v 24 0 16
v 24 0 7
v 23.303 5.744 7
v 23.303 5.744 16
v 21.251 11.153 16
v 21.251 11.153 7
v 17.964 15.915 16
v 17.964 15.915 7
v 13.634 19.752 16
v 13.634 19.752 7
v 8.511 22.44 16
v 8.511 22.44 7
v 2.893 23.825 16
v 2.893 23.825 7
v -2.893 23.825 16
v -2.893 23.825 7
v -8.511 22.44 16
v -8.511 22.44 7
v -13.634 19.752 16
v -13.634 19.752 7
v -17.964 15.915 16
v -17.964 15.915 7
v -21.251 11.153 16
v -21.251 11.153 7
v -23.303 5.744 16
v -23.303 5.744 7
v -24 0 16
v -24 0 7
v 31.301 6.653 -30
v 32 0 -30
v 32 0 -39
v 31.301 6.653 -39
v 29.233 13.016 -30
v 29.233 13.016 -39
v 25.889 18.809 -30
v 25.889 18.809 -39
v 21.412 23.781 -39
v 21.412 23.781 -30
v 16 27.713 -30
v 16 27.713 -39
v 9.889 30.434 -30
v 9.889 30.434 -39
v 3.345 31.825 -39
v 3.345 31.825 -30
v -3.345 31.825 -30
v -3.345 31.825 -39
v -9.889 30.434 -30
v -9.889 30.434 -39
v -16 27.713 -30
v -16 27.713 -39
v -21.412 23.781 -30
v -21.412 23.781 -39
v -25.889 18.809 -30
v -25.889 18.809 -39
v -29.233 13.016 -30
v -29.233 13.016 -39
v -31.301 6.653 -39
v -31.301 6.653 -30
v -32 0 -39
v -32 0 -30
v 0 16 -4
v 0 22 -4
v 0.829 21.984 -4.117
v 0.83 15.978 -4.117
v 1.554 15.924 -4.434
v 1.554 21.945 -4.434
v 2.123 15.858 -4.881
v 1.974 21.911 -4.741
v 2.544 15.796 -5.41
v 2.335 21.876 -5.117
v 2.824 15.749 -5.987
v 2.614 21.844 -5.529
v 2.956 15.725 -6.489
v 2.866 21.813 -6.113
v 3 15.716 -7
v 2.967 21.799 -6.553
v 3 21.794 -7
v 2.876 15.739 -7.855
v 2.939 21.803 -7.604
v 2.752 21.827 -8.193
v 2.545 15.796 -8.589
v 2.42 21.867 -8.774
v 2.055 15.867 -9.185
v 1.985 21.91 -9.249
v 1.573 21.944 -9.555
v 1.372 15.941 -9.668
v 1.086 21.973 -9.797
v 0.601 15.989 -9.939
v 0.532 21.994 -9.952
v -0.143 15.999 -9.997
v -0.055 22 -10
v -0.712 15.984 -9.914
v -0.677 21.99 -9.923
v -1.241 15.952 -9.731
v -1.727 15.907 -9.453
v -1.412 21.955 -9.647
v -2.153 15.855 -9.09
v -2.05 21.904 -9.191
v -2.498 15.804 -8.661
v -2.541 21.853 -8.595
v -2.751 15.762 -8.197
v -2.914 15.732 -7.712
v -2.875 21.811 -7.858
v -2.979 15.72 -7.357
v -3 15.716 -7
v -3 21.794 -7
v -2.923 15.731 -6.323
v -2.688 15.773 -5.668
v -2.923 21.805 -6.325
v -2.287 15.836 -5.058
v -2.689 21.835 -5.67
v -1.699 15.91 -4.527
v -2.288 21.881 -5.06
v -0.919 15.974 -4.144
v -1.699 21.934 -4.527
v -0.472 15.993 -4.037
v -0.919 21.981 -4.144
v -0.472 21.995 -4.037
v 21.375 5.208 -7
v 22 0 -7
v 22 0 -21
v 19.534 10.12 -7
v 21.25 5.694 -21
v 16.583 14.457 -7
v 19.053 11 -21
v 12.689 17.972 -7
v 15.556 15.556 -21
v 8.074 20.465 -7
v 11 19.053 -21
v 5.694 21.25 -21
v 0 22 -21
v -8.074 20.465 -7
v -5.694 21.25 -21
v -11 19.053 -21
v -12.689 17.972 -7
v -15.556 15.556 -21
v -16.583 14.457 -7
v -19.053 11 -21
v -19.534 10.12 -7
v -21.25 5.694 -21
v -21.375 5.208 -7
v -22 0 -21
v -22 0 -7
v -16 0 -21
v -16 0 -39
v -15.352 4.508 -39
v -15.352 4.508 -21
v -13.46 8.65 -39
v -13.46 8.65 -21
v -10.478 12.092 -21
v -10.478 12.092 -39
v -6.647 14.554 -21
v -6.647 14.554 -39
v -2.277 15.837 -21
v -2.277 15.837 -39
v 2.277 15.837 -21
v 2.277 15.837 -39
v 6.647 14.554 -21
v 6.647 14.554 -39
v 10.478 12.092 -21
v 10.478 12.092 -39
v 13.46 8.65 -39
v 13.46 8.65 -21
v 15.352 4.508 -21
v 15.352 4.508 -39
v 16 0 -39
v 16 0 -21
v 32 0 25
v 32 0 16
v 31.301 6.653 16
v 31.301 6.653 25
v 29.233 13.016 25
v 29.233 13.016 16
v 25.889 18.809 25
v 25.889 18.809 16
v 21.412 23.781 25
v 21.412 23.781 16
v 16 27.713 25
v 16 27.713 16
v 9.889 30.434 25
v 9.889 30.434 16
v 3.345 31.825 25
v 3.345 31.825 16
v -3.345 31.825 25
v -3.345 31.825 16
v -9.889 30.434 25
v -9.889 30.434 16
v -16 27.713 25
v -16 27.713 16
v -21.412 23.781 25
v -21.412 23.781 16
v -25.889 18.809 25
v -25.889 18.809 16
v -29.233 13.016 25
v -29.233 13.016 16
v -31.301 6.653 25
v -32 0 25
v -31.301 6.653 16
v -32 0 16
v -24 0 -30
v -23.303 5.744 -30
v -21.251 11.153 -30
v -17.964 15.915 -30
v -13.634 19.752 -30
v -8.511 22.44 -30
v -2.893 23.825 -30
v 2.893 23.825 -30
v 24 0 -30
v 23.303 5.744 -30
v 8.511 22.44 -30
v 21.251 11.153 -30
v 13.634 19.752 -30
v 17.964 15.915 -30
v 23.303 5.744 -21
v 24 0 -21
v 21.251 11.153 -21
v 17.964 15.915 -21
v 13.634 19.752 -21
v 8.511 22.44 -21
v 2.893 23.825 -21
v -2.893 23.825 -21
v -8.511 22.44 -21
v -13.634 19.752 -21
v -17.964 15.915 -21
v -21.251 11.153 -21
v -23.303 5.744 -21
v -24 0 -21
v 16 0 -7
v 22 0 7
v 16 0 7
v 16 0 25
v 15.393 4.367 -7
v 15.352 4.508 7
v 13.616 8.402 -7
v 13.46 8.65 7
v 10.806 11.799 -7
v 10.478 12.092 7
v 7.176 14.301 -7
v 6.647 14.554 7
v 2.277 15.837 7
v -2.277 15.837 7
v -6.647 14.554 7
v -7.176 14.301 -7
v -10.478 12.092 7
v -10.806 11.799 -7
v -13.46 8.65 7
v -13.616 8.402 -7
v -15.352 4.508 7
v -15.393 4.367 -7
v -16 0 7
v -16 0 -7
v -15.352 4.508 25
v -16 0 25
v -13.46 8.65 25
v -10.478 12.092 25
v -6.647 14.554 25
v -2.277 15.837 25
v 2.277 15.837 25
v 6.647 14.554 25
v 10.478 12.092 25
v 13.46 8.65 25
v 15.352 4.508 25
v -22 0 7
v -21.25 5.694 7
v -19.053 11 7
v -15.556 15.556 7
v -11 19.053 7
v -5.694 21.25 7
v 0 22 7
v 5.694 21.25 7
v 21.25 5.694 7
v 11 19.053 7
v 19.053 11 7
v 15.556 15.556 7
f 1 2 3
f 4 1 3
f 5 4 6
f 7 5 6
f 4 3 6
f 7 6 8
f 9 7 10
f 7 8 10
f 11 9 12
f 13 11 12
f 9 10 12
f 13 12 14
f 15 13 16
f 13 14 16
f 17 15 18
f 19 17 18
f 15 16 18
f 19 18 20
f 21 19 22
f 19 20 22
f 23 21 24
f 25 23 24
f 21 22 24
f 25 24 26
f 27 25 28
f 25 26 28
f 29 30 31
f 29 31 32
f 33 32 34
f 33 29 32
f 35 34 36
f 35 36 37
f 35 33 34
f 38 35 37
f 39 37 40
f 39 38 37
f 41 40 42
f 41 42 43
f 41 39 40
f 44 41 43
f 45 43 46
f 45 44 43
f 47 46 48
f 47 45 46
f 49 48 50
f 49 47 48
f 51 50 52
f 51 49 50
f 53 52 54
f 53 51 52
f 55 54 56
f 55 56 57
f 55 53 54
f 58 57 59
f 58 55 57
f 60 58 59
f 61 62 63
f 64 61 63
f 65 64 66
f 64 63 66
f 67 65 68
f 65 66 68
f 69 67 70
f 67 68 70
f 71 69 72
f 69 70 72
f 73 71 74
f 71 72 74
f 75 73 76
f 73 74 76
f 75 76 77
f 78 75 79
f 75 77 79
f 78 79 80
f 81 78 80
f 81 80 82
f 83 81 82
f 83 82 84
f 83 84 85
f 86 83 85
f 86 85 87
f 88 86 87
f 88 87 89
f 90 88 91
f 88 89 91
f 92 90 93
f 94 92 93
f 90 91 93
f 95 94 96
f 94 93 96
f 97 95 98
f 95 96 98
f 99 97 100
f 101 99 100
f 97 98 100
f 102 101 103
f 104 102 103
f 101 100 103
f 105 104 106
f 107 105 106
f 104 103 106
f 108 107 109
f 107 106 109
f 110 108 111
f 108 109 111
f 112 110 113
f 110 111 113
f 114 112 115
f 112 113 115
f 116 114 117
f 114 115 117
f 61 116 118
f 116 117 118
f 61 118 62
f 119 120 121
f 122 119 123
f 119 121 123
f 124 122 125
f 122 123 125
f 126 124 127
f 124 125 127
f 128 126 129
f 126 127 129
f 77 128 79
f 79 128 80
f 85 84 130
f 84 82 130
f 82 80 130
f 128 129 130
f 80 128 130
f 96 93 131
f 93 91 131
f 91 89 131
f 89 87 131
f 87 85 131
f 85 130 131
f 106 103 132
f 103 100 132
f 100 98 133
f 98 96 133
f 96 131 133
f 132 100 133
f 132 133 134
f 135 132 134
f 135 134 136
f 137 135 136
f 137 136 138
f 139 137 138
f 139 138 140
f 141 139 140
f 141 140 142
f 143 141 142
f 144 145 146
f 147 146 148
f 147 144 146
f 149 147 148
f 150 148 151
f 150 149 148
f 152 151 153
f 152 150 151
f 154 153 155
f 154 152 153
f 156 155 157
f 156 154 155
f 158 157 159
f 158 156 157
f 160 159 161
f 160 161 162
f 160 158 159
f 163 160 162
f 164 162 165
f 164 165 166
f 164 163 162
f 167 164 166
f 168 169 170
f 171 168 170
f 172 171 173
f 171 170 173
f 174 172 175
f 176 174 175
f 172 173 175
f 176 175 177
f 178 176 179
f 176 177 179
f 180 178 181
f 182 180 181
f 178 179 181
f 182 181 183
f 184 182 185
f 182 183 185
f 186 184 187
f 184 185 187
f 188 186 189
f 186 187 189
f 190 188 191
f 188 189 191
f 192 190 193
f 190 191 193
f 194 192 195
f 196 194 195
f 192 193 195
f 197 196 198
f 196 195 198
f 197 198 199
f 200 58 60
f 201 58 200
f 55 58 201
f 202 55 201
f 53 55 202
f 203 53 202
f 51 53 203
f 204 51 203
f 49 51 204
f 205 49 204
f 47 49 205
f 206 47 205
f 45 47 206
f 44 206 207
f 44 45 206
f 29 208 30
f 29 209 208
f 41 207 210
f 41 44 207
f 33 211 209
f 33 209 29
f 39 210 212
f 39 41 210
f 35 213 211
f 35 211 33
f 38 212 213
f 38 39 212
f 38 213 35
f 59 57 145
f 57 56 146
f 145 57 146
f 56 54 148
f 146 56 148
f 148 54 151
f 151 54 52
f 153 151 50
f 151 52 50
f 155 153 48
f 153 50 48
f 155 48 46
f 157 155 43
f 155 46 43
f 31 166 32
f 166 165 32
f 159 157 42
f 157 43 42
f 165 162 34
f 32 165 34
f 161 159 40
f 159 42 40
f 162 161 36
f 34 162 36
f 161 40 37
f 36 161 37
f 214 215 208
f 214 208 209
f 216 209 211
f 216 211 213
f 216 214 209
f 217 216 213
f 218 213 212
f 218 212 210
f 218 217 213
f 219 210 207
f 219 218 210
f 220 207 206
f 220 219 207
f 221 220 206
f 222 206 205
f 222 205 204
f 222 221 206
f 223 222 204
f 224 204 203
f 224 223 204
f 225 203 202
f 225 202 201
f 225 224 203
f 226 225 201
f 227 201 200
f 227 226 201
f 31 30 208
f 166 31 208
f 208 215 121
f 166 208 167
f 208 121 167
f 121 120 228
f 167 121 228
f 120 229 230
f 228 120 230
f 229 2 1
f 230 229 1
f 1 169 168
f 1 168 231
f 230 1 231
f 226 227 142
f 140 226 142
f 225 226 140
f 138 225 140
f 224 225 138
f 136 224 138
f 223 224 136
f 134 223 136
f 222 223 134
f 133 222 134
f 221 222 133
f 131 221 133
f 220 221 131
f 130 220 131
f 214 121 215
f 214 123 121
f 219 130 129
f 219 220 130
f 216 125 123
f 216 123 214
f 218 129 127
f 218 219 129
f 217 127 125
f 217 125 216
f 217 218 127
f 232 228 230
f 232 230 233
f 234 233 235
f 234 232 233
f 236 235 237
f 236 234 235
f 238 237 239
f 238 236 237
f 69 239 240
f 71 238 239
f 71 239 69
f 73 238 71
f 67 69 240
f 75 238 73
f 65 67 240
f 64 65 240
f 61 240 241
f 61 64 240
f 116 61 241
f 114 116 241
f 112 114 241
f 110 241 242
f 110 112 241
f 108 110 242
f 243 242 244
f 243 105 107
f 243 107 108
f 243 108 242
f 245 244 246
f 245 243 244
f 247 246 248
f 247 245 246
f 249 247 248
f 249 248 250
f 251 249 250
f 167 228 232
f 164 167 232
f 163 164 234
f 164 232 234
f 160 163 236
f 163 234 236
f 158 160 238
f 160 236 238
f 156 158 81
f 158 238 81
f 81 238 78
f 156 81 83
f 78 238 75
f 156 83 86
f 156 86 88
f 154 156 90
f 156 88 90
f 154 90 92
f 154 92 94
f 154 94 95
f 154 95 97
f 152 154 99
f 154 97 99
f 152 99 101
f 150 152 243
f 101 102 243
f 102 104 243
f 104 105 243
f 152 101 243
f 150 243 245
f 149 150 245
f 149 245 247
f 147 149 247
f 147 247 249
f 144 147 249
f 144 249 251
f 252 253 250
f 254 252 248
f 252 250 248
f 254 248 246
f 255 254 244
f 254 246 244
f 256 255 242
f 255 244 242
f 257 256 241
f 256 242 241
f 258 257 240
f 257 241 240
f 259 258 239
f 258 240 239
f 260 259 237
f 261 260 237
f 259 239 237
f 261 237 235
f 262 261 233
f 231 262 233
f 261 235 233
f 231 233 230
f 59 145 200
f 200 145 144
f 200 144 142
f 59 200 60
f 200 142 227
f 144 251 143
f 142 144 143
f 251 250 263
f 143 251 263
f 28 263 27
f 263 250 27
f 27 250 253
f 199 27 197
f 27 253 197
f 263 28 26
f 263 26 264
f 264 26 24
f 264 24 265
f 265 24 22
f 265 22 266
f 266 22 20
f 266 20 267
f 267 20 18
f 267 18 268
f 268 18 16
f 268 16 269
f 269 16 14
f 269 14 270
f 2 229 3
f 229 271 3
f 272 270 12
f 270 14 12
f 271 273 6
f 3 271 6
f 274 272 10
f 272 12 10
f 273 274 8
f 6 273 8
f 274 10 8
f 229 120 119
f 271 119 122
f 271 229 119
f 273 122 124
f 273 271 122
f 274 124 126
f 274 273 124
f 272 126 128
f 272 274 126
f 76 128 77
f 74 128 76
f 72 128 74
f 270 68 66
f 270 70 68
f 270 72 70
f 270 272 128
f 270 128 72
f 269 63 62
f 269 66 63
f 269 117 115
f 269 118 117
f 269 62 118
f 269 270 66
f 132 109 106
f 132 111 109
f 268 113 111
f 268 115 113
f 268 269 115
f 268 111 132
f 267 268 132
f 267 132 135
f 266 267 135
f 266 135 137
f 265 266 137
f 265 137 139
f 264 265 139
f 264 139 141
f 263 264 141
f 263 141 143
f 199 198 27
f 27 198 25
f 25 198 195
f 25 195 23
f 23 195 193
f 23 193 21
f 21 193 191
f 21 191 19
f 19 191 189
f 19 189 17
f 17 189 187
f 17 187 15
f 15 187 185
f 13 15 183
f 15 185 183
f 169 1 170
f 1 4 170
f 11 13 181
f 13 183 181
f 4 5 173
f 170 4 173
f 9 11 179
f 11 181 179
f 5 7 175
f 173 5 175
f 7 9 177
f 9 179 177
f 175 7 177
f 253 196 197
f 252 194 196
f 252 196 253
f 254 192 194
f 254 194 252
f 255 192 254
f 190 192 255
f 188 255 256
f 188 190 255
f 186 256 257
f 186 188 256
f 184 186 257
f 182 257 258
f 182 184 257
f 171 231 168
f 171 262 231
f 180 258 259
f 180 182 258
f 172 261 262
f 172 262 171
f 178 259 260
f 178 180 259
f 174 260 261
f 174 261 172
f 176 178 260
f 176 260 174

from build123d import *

# Parameters (mm, degrees)
SKETCH1_R           = 22
SKETCH1_R_2         = 16
BOSS_EXTRUDE2_DEPTH = 7
SKETCH3_R           = 24
BOSS_EXTRUDE6_DEPTH = 9
SKETCH6_R           = 32
BOSS_EXTRUDE7_DEPTH = 9
SKETCH7_R           = 16
CUT_EXTRUDE2_DEPTH  = 56.425625842
CUT_EXTRUDE3_DEPTH  = 79.383671769
SKETCH9_R           = 3
CUT_EXTRUDE4_DEPTH  = 56.036351623


with BuildPart() as part:
    # Sketch1 → Boss-Extrude2 (new, symmetric)
    with BuildSketch(Plane.XY):
        Circle(SKETCH1_R)
        Circle(SKETCH1_R_2, mode=Mode.SUBTRACT)
    extrude(amount=BOSS_EXTRUDE2_DEPTH, both=True)

    # Sketch3 → Boss-Extrude6 (add)
    with BuildSketch(Plane.XY.offset(7)):
        Circle(SKETCH3_R)
    extrude(amount=BOSS_EXTRUDE6_DEPTH)

    # Sketch6 → Boss-Extrude7 (add)
    with BuildSketch(Plane.XY.offset(16)):
        Circle(SKETCH6_R)
    extrude(amount=BOSS_EXTRUDE7_DEPTH)

    # Sketch7 → Cut-Extrude2 (cut, through all)
    with BuildSketch(Plane(origin=(0, 0, -7), x_dir=(-1, 0, 0), z_dir=(0, 0, -1))):
        Circle(SKETCH7_R)
    extrude(amount=-CUT_EXTRUDE2_DEPTH, mode=Mode.SUBTRACT)

    # Mirror3: part across plane


with BuildPart() as part_1:
    add(part.part)
    add(part.part.mirror(Plane.XY.offset(-7)))

    # Sketch8 → Cut-Extrude3 (cut, through all)
    with BuildSketch(Plane.XY.offset(25)):
        Polygon((-194.543052514, 0), (-35.372068519, 0), (34.570182834, 0), (193.741166829, 0), (193.741166829, -318.34196799), (-194.543052514, -318.34196799), align=None)
    extrude(amount=-CUT_EXTRUDE3_DEPTH, mode=Mode.SUBTRACT)

    # Sketch9 → Cut-Extrude4 (cut, through all)
    with BuildSketch(Plane(origin=(0, 22, 0), x_dir=(1, 0, 0), z_dir=(0, 1, 0))):
        with Locations(Location((0, 7, 0), (0, 0, 270))):
            Circle(SKETCH9_R)
    extrude(amount=-CUT_EXTRUDE4_DEPTH, mode=Mode.SUBTRACT)


solid = part_1.part
